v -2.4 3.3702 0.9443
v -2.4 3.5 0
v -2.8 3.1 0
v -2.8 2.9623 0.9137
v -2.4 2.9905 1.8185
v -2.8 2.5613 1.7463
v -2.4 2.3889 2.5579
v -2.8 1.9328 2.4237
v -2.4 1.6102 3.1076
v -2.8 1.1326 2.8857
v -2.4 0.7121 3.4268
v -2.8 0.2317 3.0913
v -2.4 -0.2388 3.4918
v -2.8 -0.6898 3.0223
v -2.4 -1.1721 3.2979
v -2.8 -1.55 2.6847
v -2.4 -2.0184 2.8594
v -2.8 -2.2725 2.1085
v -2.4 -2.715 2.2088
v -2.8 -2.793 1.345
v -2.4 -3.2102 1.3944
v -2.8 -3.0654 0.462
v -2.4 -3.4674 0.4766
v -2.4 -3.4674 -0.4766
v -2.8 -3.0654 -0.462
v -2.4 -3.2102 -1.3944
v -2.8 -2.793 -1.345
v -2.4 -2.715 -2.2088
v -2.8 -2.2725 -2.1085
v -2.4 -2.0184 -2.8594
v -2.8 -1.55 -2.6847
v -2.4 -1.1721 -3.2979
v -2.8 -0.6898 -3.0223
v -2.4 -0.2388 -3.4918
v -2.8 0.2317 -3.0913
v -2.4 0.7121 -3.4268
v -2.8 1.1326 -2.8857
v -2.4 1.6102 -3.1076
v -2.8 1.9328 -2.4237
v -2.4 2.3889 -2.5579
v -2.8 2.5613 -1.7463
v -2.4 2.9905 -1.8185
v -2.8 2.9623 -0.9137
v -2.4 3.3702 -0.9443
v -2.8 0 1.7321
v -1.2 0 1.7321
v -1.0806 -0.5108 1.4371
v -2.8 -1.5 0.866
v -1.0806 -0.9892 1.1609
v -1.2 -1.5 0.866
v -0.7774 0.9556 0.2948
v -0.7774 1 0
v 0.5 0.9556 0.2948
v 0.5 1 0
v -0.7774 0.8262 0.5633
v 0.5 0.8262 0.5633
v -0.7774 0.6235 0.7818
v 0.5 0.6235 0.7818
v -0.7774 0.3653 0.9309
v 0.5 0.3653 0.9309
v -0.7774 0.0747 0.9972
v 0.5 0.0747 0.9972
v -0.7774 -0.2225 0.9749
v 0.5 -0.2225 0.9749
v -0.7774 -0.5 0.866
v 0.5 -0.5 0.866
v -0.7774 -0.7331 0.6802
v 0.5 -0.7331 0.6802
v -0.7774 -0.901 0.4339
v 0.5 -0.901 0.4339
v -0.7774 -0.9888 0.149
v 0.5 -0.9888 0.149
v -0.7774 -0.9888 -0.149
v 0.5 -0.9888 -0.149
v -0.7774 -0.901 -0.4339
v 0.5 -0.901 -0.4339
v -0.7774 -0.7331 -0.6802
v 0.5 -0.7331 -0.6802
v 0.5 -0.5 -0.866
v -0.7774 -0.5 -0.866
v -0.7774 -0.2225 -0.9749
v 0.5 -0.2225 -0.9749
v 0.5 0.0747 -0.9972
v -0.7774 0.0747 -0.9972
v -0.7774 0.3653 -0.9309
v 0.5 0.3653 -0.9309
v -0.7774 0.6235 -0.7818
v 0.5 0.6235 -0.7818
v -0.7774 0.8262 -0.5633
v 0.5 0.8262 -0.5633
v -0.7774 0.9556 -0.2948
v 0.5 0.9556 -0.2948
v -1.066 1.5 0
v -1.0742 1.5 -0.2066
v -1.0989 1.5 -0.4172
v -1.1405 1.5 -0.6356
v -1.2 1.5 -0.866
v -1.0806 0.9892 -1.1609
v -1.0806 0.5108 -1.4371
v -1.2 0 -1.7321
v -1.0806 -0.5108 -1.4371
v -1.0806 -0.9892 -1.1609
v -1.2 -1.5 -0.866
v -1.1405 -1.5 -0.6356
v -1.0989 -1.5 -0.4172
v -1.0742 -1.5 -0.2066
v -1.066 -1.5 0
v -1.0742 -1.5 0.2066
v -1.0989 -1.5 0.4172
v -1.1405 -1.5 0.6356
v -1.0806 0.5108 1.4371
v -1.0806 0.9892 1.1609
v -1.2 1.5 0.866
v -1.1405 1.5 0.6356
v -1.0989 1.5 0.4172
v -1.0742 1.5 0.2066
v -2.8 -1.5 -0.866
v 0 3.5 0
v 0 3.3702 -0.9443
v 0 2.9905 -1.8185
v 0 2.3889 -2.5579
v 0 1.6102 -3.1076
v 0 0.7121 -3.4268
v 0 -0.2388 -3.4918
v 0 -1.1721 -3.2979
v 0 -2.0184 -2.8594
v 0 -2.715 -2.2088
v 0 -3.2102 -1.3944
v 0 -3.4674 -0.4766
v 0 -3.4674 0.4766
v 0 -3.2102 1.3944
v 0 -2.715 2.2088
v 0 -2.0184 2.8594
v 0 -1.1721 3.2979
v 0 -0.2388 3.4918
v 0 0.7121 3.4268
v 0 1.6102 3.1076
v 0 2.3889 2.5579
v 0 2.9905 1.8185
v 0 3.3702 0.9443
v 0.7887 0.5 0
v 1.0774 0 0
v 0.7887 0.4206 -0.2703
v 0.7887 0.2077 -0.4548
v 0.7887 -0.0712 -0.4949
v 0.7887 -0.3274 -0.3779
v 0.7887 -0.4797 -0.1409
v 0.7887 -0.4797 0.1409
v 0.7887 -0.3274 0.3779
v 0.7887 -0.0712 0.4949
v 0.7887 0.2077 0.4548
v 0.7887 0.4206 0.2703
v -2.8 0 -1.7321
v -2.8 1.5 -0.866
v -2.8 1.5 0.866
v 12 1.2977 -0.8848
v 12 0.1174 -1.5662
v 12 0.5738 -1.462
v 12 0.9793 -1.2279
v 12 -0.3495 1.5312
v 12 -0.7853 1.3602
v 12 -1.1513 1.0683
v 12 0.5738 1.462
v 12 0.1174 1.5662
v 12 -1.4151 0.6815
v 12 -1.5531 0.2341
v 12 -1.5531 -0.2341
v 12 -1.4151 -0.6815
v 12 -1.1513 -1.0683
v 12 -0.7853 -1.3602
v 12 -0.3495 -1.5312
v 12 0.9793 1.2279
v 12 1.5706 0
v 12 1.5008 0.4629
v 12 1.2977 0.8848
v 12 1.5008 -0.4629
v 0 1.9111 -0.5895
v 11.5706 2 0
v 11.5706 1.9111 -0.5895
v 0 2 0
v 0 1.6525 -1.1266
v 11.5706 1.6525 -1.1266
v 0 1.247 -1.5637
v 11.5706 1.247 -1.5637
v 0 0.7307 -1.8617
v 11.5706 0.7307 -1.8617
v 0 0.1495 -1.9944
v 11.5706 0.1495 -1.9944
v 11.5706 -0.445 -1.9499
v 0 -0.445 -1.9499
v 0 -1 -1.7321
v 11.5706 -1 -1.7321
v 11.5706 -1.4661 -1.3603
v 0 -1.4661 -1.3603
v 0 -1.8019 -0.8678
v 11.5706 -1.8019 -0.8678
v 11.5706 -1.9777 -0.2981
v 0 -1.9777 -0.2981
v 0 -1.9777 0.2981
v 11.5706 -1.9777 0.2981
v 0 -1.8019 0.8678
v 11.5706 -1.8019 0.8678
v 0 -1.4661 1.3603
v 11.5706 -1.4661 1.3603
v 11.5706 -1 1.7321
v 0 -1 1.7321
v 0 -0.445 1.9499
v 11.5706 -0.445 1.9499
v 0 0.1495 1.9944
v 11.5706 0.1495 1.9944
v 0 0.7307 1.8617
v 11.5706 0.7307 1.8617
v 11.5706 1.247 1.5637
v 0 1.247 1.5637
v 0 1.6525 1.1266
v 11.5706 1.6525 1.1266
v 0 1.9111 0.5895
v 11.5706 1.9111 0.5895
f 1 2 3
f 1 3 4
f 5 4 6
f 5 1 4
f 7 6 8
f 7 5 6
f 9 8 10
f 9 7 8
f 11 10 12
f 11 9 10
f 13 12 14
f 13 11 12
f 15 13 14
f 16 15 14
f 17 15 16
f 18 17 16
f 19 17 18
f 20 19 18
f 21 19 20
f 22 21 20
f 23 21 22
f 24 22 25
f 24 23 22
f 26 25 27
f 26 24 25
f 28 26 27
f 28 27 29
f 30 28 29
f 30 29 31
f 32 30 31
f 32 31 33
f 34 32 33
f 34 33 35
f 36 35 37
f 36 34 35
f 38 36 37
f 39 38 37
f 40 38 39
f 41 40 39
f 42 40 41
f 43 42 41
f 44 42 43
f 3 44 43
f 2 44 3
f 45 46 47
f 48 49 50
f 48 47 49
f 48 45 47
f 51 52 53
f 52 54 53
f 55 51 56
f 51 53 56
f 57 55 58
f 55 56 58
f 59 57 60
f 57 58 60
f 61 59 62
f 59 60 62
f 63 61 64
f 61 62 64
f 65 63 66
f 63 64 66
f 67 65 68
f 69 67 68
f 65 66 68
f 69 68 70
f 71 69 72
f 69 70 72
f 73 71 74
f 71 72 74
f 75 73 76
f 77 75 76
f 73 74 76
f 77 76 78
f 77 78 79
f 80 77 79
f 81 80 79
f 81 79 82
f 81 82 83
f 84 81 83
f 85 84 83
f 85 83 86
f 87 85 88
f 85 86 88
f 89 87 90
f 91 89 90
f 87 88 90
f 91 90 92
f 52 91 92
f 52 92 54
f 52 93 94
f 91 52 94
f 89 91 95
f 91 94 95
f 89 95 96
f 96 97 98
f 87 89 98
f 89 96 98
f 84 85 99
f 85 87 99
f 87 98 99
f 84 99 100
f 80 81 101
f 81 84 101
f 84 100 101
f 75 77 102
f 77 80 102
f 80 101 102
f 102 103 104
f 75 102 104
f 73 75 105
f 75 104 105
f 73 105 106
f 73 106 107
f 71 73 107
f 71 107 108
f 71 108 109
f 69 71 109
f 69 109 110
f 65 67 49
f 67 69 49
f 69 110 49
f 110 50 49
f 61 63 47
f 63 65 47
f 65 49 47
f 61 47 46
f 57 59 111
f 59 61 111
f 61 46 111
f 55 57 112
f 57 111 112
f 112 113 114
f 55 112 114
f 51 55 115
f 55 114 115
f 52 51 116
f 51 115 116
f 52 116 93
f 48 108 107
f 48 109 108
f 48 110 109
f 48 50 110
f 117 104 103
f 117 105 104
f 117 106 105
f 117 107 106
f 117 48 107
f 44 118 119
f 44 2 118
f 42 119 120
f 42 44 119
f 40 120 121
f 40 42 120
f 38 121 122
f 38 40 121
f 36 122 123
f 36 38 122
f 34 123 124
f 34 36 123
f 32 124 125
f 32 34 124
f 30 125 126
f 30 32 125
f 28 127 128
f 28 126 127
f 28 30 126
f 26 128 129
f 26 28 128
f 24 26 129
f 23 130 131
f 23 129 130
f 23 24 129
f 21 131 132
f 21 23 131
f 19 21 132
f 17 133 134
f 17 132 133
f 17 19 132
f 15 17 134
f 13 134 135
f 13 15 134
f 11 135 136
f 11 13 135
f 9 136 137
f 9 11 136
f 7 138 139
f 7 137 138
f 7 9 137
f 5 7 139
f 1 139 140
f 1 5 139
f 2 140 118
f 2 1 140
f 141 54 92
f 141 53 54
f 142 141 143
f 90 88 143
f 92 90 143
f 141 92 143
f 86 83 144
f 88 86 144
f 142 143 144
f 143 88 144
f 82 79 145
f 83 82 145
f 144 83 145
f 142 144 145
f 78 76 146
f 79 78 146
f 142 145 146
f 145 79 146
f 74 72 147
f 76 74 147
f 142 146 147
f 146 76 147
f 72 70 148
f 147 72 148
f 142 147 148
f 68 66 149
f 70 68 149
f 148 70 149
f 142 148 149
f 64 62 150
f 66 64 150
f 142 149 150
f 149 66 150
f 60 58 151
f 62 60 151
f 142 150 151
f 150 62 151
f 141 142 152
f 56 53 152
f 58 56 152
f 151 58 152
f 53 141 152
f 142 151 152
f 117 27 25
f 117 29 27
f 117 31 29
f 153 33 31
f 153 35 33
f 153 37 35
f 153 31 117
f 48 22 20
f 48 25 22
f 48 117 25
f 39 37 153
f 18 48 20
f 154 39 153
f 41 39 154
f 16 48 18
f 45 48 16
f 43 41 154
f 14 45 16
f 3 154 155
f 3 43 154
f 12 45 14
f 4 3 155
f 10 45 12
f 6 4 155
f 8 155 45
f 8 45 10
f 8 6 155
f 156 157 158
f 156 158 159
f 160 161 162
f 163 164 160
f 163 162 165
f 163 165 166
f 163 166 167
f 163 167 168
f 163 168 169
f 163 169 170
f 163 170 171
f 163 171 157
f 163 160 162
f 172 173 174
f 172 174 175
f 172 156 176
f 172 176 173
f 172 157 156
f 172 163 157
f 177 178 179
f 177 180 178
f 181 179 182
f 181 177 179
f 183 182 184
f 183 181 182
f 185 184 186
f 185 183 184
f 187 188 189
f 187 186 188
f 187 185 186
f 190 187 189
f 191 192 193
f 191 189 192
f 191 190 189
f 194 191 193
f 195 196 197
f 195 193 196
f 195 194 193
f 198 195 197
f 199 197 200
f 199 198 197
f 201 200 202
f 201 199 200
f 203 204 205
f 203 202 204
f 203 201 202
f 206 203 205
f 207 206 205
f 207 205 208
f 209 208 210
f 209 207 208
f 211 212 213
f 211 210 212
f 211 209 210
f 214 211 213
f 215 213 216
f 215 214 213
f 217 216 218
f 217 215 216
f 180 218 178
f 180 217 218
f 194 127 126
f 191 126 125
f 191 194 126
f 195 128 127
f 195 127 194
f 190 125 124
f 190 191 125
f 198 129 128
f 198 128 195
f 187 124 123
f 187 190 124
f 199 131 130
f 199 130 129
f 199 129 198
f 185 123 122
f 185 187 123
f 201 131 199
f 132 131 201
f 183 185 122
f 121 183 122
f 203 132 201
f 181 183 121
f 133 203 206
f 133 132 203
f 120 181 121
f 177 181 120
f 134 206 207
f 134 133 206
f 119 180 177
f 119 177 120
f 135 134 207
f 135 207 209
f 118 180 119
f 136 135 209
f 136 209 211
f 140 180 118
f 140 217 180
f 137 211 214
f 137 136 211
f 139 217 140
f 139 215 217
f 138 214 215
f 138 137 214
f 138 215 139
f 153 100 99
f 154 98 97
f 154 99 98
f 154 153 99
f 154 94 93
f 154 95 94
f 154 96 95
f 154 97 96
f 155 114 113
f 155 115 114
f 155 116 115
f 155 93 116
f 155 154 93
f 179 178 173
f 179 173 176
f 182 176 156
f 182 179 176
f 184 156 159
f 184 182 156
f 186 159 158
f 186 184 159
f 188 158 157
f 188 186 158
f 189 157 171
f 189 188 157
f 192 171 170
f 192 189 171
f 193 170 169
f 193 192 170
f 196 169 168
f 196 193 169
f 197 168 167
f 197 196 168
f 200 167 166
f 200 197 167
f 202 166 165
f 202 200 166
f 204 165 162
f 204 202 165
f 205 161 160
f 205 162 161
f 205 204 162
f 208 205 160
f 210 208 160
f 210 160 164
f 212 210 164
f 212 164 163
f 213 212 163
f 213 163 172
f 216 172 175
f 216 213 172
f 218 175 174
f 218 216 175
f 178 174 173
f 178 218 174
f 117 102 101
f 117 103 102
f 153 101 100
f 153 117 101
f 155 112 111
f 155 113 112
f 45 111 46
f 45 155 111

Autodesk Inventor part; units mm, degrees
ref_plane "YZ Plane" through (0, 0, 0) normal (1, 0, 0) x (0, 1, 0)
ref_plane "XZ Plane" through (0, 0, 0) normal (0, 1, 0) x (-1, 0, 0)
sketch "Sketch1" plane through (0, 0, 0) normal (0, 0, 1) x (1, 0, 0)
  line L0 (1.0774, 0) -> (12, 0)
  line L1 (12, 0) -> (12, 2)
  line L2 (12, 2) -> (0, 2)
  line L3 (0, 2) -> (0, 3.5)
  line L4 (0, 3.5) -> (-2.8, 3.5)
  line L5 (-2.8, 3.5) -> (-2.8, 1.7321)
  line L6 (-2.8, 1.7321) -> (-1.2, 1.7321)
  line L7 (-1.2, 1.7321) -> (-0.7774, 1)
  line L8 (-5.76, 0) -> (14.96, 0) projected
  line L9 (0, -0.7) -> (0, 4.2) projected
  line L10 (-0.7774, 1) -> (0.5, 1)
  line L11 (0.5, 1) -> (1.0774, 0)
  line L12 (-2.8, 1.7321) -> (-2.8, 0) construction
  line L13 (-2.8, 3.1) -> (-2.4, 3.5)
  dimension "d0" = 2.8
  dimension "d1" = 1.6
  dimension "d2" = 60
  dimension "d3" = 4
  dimension "d4" = 3.4641
  dimension "d5" = 7
  dimension "d15" = 3.3
  dimension "d16" = 2
  dimension "d17" = 12
  dimension "d32" = 45
  dimension "d33" = 0.4
revolve "Body" add sketch "Sketch1" angle 360 about axis through (1.0774, 0, 0) along (1, 0, 0) contours L11 L10 L9 L2 L1 L0 | L10 L7 L6 L5 L13 L4 L3 L9 | L13 L5 L4
revolve "Chamfer2" cut sketch "Sketch1" angle 360 about axis through (-10, 0, 0) along (1, 0, 0) contours L13 L5 L4
sketch "Sketch2" plane through (-2.8, 0, 0) normal (-1, 0, 0) x (0, 0, 1)
  circle A0 centre (0, 0) radius 1.7321 projected
  line L0 (0, -4.9) -> (0, 4.9) projected
  line L1 (-4.9, 0) -> (4.9, 0) projected
  line L2 (1.7321, 0) -> (0.866, -1.5)
  line L3 (0.866, -1.5) -> (-0.866, -1.5)
  line L4 (-0.866, -1.5) -> (-1.7321, 0)
  line L5 (-1.7321, 0) -> (-0.866, 1.5)
  line L6 (-0.866, 1.5) -> (0.866, 1.5)
  line L7 (0.866, 1.5) -> (1.7321, 0)
extrude "Slot" add sketch "Sketch2" against normal up to next contours L7 A0 | A0 L2 | L6 L0 A0 | A0 L0 L3 | L0 L6 A0 | A0 L3 L0 | L4 A0 | A0 L5
thread "Thread" size "M4x0.7" class "6g" standard "ISO Metric profile" length 8.5
chamfer "Chamfer1" distance 0.4294 distance2 0.4294 1 edges at (12, -2, 0) measured on face at (12, -1.1003, -0.6618)
ref_plane "Work Plane1" through (6, 0, 0) normal (0, 0.5, 0.866) x (1, 0, 0)
equation "\"d0\" = KOH"
equation "\"d1\" = INTI"
equation "\"d3\" = GD"
equation "\"d4\" = 1.1547 * SW"
equation "\"d5\" = KOD"
equation "\"d15\" = INFT"
equation "\"d16\" = SDT"
equation "\"d17\" = NLG"
equation "\"d33\" = Cham"
equation "\"d7\" = GEL"
equation "\"d9\" = -0.5 * SPD + 0.5 * GD"
equation "\"d12\" = GUL"
equation "\"GD\" = NND"
equation "\"NLG\" = 12"
equation "\"GEL\" = 8.5"
equation "\"KOD\" = 7"
equation "\"KOH\" = 2.8"
equation "\"GUL\" = 0.61345 * PTC"
equation "\"SW\" = 3"
equation "\"INTI\" = 1.6"
equation "\"SPD\" = NND - 1.2269 * PTC"
equation "\"SDT\" = 2"
equation "\"INFT\" = 3.3"
equation "\"Cham\" = 0.4"
equation "\"TOA\" = 30deg"
equation "\"GD1\" = THREADDIA - 1.2269 * PTC"
equation "\"THREADDIA\" = 4"
equation "\"BDM\" = NND"
equation "\"FAWI\" = 45deg"
equation "\"RR\" = 0.1 * NND"
equation "\"PTC\" = 0.7"
equation "\"NND\" = 4"
equation "\"FAWI1\" = 45deg"
equation "\"GAL\" = 0.61345 * PTC"
equation "\"E0\" = 1.155 * SW"
properties part number "DIN 6912 - M4 x 12" material "Steel, Mild"
